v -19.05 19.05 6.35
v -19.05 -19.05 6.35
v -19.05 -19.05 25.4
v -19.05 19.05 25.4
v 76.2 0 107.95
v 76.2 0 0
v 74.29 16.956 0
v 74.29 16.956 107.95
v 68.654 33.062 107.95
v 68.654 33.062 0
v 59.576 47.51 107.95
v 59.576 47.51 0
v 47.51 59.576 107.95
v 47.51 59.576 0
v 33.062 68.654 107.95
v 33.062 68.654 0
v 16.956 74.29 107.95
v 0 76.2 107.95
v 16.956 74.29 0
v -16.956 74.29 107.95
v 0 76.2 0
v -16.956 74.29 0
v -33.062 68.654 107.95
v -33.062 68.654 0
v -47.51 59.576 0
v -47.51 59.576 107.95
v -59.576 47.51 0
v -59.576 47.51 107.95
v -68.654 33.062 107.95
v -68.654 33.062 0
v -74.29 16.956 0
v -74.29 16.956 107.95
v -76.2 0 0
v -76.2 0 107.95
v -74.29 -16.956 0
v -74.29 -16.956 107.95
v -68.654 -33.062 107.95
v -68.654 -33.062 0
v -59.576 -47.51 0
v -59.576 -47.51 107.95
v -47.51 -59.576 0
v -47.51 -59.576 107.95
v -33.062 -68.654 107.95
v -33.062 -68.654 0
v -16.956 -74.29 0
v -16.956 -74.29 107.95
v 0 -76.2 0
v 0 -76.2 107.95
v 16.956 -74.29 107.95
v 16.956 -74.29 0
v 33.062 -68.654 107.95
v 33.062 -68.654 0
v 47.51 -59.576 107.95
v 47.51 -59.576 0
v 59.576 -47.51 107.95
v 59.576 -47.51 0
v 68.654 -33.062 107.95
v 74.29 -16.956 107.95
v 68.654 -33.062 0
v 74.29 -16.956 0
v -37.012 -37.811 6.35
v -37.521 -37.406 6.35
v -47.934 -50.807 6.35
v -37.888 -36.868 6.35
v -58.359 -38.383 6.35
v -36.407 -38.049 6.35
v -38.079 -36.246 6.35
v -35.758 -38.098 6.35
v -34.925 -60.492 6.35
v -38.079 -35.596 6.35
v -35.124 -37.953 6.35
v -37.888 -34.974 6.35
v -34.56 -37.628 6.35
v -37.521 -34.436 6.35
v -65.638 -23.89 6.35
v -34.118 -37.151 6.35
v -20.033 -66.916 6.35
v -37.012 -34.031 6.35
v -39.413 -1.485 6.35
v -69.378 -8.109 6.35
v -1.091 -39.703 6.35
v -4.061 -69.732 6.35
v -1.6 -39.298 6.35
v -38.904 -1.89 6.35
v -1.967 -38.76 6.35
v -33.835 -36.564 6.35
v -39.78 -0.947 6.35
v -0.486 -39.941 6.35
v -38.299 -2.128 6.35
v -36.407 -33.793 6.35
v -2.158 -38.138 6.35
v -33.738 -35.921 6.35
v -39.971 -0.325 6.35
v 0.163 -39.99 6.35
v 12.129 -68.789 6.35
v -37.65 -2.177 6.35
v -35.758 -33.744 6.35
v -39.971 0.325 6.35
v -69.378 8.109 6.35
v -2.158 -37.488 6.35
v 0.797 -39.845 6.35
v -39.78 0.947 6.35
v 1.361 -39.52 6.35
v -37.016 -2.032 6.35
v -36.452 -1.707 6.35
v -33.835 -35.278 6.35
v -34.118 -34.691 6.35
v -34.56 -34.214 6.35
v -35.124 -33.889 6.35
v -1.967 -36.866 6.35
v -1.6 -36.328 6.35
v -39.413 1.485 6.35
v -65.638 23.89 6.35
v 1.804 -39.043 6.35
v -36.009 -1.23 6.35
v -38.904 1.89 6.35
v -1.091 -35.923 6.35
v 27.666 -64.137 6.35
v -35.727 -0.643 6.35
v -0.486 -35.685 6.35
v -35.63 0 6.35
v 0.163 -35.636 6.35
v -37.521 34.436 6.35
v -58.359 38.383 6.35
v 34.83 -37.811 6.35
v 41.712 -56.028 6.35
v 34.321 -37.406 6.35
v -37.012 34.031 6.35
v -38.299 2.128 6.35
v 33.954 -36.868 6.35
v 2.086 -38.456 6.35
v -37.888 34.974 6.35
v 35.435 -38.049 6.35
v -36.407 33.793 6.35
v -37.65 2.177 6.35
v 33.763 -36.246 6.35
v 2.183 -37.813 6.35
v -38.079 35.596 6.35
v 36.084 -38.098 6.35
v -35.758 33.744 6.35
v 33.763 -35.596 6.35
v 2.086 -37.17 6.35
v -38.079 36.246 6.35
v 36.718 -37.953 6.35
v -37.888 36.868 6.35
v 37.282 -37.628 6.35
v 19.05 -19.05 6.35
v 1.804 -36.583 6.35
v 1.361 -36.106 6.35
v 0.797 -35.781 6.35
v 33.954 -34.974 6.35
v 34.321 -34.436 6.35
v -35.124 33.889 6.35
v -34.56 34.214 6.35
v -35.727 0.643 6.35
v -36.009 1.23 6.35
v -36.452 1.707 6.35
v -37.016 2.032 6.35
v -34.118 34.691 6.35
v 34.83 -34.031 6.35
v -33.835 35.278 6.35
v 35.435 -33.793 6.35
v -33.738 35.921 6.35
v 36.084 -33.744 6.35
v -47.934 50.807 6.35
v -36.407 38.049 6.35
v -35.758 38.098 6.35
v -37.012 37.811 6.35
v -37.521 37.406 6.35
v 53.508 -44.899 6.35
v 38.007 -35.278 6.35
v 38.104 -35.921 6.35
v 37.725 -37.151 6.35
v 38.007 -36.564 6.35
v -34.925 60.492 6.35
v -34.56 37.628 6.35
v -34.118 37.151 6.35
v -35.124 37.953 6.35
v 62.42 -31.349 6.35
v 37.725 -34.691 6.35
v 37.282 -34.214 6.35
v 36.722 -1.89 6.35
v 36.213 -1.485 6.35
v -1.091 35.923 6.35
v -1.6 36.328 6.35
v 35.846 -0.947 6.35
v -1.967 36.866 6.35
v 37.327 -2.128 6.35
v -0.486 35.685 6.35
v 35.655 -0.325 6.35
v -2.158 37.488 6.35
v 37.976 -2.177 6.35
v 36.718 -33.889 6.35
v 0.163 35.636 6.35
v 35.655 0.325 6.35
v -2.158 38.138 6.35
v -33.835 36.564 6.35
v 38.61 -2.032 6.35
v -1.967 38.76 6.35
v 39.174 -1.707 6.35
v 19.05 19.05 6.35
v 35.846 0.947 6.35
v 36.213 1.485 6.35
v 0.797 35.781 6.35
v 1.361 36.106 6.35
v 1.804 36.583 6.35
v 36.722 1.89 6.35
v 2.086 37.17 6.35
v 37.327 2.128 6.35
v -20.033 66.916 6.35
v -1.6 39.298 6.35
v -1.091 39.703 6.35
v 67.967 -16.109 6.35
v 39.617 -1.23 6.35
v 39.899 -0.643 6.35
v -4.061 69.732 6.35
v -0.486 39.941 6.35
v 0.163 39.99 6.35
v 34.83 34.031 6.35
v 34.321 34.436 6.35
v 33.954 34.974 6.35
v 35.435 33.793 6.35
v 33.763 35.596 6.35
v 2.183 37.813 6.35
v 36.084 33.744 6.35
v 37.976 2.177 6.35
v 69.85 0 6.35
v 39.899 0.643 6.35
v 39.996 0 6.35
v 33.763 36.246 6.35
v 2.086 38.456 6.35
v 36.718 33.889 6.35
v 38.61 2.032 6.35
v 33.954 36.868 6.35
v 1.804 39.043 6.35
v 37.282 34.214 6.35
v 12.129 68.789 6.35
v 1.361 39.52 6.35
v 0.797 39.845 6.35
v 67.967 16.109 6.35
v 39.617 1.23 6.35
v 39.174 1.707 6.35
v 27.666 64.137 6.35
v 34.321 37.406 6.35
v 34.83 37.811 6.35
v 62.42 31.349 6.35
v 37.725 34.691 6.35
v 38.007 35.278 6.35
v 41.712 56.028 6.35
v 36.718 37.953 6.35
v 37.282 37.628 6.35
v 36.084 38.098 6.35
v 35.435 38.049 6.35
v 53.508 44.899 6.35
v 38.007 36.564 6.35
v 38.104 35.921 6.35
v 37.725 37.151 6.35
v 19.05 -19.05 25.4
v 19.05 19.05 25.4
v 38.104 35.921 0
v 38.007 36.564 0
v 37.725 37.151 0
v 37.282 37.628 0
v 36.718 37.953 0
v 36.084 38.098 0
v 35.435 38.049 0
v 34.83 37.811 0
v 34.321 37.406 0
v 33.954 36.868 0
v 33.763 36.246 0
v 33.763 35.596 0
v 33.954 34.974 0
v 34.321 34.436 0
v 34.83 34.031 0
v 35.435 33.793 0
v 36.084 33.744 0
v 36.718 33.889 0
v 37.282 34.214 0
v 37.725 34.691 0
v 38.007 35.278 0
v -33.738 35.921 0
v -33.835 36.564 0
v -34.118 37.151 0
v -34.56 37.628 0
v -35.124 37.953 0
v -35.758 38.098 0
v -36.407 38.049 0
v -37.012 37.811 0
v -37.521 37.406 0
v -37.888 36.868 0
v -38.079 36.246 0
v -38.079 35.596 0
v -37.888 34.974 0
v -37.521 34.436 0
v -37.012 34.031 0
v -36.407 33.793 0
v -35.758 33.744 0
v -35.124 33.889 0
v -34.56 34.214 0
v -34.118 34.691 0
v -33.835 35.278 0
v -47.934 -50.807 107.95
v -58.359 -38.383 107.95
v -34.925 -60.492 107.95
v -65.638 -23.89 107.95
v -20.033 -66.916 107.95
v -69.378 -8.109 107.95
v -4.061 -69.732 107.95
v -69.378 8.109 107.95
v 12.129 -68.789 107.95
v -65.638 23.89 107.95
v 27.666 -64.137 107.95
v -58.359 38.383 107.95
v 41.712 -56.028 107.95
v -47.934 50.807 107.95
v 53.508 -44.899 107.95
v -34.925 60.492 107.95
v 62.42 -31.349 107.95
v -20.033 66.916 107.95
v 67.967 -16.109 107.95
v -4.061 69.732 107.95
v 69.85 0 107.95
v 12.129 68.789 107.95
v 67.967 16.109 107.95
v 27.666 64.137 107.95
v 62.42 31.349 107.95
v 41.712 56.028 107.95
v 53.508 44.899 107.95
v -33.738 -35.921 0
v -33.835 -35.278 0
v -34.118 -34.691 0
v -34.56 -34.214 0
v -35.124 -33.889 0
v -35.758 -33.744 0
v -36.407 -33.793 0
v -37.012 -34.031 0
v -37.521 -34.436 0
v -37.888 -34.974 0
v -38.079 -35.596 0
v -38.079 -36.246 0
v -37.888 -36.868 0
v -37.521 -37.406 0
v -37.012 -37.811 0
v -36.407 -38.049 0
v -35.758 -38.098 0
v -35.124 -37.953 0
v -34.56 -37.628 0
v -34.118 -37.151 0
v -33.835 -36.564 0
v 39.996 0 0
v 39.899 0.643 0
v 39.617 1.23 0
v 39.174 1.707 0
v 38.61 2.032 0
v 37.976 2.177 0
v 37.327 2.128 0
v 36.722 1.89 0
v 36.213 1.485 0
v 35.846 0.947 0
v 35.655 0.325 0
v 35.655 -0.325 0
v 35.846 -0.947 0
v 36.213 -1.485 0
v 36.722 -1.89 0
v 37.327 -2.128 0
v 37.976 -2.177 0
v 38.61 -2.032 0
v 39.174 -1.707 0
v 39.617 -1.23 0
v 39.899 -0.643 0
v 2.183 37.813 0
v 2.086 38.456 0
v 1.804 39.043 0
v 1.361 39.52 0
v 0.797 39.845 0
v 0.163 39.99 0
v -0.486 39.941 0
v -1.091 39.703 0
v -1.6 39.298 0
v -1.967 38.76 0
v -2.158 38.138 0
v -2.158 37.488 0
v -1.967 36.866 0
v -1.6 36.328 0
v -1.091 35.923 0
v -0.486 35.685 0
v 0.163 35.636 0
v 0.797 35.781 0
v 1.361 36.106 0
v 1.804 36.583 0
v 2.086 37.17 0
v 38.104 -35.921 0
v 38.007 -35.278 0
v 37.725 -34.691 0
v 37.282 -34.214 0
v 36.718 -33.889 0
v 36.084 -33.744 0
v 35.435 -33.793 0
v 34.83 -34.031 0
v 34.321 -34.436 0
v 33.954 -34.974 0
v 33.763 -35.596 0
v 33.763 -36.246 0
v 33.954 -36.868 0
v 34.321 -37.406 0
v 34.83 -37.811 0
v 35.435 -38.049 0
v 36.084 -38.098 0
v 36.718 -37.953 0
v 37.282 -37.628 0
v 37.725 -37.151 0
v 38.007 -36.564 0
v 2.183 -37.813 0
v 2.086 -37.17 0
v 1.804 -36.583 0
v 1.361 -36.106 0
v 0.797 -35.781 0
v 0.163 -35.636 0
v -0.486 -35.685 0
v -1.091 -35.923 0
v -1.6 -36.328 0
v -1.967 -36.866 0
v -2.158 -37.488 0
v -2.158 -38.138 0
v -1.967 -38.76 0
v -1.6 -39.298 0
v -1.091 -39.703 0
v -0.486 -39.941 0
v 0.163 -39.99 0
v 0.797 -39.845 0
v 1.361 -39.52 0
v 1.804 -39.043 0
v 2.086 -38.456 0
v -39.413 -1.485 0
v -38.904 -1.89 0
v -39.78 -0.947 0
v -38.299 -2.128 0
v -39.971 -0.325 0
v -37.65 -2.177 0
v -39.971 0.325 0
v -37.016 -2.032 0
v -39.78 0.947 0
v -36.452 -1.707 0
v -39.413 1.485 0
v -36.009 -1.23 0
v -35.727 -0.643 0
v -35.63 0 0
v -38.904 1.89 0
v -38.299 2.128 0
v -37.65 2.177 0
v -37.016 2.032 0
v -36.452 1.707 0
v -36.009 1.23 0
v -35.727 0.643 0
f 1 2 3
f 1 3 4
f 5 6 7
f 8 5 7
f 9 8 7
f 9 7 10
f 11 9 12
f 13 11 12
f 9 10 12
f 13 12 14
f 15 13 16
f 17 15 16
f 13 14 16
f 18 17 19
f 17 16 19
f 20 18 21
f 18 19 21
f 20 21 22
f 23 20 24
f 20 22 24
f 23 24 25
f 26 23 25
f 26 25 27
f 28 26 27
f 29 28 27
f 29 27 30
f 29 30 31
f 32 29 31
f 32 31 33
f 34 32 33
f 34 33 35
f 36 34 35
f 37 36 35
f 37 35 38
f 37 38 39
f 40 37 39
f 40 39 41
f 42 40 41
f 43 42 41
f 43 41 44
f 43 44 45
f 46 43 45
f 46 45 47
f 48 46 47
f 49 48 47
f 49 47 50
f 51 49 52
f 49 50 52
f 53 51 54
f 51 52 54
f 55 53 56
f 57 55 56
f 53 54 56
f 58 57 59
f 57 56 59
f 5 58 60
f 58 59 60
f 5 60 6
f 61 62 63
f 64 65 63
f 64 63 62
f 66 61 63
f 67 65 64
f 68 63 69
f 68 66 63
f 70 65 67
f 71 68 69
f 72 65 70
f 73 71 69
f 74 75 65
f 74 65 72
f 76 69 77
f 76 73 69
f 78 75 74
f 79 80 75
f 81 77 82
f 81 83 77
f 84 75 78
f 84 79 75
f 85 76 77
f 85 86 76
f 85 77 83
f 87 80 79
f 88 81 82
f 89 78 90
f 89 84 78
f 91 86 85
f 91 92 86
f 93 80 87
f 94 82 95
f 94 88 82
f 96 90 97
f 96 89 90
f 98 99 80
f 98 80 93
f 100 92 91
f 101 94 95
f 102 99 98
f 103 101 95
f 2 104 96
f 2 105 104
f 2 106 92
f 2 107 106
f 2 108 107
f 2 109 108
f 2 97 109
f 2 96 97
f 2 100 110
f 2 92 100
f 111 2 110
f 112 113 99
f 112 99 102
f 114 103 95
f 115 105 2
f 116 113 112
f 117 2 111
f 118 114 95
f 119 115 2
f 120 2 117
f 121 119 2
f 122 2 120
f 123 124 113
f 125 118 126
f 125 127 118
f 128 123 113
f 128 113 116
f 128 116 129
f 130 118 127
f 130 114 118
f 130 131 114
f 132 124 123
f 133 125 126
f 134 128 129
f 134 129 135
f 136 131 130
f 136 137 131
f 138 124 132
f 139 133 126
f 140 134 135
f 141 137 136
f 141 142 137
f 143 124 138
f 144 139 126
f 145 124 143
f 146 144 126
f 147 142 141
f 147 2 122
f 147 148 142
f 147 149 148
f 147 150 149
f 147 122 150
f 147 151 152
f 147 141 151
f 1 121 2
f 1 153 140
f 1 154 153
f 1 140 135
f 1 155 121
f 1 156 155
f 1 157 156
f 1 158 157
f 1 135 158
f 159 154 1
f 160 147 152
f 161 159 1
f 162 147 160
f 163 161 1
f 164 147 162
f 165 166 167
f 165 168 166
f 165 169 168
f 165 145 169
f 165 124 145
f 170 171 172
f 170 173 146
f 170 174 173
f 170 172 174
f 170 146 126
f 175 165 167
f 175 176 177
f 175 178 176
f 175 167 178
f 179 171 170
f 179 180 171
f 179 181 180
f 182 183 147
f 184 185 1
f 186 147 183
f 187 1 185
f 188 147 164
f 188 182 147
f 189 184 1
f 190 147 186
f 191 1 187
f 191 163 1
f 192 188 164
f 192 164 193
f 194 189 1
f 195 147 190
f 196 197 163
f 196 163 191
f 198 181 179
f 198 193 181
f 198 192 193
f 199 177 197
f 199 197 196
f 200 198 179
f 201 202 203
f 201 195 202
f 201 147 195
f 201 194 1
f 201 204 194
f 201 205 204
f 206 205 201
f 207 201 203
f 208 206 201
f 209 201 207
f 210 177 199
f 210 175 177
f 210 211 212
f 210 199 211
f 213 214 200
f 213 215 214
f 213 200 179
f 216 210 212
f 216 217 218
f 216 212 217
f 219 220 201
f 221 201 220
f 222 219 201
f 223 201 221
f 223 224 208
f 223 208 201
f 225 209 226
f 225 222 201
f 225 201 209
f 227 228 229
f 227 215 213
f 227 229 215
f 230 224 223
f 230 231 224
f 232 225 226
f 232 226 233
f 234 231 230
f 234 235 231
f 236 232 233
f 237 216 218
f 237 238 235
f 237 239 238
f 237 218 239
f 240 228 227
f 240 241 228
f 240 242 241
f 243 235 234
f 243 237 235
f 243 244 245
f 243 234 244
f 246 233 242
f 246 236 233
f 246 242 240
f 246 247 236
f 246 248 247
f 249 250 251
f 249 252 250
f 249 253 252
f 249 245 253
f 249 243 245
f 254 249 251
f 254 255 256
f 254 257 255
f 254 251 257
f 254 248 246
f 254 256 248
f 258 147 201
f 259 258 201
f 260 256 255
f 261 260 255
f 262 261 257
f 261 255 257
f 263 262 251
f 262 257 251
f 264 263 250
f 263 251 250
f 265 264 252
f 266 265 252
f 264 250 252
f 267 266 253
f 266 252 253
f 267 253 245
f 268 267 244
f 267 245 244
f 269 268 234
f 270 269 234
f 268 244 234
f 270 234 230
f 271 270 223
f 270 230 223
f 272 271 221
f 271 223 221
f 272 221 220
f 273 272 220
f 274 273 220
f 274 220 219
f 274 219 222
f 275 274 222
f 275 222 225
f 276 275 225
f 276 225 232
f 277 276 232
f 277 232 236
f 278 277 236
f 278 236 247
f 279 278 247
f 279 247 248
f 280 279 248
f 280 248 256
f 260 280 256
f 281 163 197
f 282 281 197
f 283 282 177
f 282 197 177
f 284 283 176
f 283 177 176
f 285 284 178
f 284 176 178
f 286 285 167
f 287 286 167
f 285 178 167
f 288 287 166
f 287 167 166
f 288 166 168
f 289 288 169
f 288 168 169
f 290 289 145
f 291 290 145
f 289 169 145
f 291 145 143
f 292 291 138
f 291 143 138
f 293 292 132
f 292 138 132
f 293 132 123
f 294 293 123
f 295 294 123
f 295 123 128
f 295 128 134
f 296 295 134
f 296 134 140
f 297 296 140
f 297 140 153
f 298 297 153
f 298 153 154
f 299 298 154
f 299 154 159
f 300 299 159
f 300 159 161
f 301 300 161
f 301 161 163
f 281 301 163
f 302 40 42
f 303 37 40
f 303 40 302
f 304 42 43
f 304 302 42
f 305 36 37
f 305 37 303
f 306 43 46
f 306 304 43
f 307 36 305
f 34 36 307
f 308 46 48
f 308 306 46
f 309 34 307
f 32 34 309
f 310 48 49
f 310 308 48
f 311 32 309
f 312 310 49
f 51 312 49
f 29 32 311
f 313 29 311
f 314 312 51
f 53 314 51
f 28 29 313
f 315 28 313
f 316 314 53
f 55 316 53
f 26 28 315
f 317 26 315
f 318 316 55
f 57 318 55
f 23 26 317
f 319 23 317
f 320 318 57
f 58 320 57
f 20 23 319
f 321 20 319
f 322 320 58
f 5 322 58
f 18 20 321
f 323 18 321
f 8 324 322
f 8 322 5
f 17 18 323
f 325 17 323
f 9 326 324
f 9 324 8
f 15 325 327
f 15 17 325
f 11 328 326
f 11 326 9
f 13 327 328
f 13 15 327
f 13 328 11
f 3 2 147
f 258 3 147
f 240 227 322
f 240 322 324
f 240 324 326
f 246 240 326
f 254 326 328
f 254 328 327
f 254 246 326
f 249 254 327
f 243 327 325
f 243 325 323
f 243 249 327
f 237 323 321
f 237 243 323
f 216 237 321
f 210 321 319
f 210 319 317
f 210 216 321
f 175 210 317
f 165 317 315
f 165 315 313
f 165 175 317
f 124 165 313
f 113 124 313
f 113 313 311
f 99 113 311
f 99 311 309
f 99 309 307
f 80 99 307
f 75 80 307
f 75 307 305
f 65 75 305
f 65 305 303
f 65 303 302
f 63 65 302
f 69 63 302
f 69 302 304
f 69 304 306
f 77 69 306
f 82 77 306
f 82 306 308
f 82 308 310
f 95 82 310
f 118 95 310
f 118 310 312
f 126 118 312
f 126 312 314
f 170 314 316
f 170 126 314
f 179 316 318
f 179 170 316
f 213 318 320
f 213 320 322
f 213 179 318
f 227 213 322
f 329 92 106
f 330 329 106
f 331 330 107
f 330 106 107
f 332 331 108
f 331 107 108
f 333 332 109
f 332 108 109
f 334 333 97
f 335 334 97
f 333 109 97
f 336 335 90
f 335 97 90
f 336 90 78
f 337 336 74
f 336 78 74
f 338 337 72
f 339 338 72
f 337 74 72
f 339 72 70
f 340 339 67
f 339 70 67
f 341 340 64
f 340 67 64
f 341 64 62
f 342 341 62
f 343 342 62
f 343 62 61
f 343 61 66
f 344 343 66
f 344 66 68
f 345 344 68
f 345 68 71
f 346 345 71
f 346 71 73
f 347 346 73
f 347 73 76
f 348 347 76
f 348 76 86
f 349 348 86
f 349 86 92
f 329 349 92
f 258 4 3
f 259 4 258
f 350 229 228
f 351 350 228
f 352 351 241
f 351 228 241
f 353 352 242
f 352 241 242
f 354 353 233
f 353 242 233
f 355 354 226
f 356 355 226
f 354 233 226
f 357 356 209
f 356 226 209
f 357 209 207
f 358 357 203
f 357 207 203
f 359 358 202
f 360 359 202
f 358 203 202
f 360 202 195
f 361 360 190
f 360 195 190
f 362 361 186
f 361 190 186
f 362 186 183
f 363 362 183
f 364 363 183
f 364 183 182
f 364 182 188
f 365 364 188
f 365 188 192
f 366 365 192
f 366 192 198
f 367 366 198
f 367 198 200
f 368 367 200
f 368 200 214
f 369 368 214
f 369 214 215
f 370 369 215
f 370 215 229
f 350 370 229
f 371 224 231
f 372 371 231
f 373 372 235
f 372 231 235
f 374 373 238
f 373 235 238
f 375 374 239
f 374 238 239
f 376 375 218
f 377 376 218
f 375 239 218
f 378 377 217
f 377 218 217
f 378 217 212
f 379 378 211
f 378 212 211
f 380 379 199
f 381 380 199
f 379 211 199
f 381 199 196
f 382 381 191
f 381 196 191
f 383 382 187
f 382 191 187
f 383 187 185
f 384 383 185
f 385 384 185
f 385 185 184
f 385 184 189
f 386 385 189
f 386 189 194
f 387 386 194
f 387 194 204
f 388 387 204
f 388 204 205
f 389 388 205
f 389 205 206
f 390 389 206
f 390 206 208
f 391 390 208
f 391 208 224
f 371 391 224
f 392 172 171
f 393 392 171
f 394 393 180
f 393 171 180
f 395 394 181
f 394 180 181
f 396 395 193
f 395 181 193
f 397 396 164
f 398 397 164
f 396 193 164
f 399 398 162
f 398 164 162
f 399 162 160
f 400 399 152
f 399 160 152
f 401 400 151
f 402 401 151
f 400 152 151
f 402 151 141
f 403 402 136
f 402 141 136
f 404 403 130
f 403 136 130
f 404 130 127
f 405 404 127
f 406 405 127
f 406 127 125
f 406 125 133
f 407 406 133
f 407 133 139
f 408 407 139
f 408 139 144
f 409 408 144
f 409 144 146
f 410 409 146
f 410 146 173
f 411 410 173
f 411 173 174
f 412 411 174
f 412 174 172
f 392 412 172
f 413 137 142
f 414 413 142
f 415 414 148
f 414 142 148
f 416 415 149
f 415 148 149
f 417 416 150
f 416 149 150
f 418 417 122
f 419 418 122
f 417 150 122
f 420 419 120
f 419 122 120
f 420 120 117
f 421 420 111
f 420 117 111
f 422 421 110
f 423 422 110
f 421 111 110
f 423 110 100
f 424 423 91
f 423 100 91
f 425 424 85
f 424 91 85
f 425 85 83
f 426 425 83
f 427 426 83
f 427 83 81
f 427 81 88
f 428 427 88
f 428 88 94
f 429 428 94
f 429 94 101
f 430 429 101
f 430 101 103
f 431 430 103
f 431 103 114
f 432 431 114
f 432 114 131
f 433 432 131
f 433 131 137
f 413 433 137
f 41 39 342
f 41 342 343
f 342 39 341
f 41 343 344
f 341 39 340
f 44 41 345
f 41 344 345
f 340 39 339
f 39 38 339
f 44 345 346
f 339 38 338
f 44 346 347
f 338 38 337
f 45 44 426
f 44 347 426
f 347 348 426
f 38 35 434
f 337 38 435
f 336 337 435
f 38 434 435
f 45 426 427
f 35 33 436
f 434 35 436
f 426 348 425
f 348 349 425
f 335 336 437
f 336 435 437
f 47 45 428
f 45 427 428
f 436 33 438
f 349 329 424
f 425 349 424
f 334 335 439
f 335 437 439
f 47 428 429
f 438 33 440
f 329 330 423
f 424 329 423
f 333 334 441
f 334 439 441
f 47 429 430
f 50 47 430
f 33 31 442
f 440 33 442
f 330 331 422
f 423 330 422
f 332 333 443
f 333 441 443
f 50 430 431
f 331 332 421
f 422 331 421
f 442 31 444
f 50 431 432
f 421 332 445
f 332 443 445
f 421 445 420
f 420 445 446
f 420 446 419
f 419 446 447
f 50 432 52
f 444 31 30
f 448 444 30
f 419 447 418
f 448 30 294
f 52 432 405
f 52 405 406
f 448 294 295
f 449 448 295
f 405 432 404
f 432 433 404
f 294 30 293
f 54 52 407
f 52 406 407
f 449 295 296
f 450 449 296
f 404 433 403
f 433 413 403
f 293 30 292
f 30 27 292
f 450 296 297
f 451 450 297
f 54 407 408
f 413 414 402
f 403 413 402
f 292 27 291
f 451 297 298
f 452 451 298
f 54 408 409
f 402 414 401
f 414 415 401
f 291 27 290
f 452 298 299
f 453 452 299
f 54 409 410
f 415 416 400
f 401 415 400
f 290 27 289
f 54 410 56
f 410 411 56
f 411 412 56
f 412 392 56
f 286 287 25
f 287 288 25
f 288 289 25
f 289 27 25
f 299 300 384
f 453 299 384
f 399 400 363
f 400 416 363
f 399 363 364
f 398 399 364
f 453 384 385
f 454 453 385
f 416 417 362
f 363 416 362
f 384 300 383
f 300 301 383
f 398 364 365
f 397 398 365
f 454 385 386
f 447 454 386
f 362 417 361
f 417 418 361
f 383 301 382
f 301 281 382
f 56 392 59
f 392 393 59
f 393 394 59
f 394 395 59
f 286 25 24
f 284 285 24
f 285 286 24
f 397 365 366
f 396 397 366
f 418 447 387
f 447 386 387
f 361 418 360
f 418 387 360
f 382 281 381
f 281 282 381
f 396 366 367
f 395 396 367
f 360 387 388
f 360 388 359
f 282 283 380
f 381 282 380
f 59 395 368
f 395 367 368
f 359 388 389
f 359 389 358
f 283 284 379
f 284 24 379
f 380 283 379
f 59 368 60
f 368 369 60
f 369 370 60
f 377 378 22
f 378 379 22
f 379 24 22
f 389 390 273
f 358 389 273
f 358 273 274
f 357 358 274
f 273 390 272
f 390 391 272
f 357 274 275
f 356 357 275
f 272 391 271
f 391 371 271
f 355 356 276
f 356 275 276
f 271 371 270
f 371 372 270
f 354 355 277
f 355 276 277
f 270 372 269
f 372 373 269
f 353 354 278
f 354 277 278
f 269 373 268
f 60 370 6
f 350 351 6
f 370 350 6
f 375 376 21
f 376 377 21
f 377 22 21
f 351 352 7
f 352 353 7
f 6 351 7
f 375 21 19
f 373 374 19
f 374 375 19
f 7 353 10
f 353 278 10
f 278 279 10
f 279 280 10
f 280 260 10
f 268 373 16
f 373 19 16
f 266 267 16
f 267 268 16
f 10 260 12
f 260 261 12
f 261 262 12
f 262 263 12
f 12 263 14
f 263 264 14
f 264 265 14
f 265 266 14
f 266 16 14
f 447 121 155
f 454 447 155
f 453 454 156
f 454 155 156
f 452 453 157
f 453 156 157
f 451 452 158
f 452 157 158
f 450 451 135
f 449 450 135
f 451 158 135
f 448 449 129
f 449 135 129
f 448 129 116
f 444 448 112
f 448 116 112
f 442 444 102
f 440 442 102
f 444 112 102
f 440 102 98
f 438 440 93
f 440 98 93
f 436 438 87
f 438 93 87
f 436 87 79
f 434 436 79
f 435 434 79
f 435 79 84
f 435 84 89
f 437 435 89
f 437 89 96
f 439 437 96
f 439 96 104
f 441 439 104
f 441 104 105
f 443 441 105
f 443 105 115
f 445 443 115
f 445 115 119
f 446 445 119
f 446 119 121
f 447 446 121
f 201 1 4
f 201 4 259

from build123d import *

# Parameters (mm, degrees)
SKETCH1_R           = 76.2
SKETCH1_R_2         = 69.85
BOSS_EXTRUDE1_DEPTH = 107.95
SKETCH3_R           = 76.2
BOSS_EXTRUDE2_DEPTH = 6.35
SKETCH5_R           = 2.1828125
CUT_EXTRUDE2_DEPTH  = 7.35
SKETCH11_R          = 2.1828125
CUT_EXTRUDE11_DEPTH = 7.35
SKETCH4_3_W         = 38.1
SKETCH4_3_H         = 38.1
BOSS_EXTRUDE3_DEPTH = 19.05


with BuildPart() as part:
    # Sketch1 → Boss-Extrude1 (new body)
    with BuildSketch(Plane.XY):
        Circle(SKETCH1_R)
        Circle(SKETCH1_R_2, mode=Mode.SUBTRACT)
    extrude(amount=BOSS_EXTRUDE1_DEPTH)

    # Sketch3 → Boss-Extrude2 (add)
    with BuildSketch(Plane.XY):
        Circle(SKETCH3_R)
    extrude(amount=BOSS_EXTRUDE2_DEPTH)

    # Sketch5 → Cut-Extrude2 (cut, through all)
    with BuildSketch(Plane.XY.offset(6.35)):
        with Locations((0, 37.81298)):
            Circle(SKETCH5_R)
        with Locations((37.81298, 0)):
            Circle(SKETCH5_R)
        with Locations((-37.81298, 0)):
            Circle(SKETCH5_R)
        with Locations((0, -37.81298)):
            Circle(SKETCH5_R)
    extrude(amount=-CUT_EXTRUDE2_DEPTH, mode=Mode.SUBTRACT)

    # Sketch11 → Cut-Extrude11 (cut, through all)
    with BuildSketch(Plane.XY.offset(6.35)):
        with Locations((-35.921024484, 35.921024484)):
            Circle(SKETCH11_R)
        with Locations((-35.921024484, -35.921024484)):
            Circle(SKETCH11_R)
        with Locations((35.921024484, -35.921024484)):
            Circle(SKETCH11_R)
        with Locations((35.921024484, 35.921024484)):
            Circle(SKETCH11_R)
    extrude(amount=-CUT_EXTRUDE11_DEPTH, mode=Mode.SUBTRACT)

    # Sketch4_3 → Boss-Extrude3 (add)
    with BuildSketch(Plane.XY.offset(6.35)):
        Rectangle(SKETCH4_3_W, SKETCH4_3_H)
    extrude(amount=BOSS_EXTRUDE3_DEPTH)


solid = part.part
